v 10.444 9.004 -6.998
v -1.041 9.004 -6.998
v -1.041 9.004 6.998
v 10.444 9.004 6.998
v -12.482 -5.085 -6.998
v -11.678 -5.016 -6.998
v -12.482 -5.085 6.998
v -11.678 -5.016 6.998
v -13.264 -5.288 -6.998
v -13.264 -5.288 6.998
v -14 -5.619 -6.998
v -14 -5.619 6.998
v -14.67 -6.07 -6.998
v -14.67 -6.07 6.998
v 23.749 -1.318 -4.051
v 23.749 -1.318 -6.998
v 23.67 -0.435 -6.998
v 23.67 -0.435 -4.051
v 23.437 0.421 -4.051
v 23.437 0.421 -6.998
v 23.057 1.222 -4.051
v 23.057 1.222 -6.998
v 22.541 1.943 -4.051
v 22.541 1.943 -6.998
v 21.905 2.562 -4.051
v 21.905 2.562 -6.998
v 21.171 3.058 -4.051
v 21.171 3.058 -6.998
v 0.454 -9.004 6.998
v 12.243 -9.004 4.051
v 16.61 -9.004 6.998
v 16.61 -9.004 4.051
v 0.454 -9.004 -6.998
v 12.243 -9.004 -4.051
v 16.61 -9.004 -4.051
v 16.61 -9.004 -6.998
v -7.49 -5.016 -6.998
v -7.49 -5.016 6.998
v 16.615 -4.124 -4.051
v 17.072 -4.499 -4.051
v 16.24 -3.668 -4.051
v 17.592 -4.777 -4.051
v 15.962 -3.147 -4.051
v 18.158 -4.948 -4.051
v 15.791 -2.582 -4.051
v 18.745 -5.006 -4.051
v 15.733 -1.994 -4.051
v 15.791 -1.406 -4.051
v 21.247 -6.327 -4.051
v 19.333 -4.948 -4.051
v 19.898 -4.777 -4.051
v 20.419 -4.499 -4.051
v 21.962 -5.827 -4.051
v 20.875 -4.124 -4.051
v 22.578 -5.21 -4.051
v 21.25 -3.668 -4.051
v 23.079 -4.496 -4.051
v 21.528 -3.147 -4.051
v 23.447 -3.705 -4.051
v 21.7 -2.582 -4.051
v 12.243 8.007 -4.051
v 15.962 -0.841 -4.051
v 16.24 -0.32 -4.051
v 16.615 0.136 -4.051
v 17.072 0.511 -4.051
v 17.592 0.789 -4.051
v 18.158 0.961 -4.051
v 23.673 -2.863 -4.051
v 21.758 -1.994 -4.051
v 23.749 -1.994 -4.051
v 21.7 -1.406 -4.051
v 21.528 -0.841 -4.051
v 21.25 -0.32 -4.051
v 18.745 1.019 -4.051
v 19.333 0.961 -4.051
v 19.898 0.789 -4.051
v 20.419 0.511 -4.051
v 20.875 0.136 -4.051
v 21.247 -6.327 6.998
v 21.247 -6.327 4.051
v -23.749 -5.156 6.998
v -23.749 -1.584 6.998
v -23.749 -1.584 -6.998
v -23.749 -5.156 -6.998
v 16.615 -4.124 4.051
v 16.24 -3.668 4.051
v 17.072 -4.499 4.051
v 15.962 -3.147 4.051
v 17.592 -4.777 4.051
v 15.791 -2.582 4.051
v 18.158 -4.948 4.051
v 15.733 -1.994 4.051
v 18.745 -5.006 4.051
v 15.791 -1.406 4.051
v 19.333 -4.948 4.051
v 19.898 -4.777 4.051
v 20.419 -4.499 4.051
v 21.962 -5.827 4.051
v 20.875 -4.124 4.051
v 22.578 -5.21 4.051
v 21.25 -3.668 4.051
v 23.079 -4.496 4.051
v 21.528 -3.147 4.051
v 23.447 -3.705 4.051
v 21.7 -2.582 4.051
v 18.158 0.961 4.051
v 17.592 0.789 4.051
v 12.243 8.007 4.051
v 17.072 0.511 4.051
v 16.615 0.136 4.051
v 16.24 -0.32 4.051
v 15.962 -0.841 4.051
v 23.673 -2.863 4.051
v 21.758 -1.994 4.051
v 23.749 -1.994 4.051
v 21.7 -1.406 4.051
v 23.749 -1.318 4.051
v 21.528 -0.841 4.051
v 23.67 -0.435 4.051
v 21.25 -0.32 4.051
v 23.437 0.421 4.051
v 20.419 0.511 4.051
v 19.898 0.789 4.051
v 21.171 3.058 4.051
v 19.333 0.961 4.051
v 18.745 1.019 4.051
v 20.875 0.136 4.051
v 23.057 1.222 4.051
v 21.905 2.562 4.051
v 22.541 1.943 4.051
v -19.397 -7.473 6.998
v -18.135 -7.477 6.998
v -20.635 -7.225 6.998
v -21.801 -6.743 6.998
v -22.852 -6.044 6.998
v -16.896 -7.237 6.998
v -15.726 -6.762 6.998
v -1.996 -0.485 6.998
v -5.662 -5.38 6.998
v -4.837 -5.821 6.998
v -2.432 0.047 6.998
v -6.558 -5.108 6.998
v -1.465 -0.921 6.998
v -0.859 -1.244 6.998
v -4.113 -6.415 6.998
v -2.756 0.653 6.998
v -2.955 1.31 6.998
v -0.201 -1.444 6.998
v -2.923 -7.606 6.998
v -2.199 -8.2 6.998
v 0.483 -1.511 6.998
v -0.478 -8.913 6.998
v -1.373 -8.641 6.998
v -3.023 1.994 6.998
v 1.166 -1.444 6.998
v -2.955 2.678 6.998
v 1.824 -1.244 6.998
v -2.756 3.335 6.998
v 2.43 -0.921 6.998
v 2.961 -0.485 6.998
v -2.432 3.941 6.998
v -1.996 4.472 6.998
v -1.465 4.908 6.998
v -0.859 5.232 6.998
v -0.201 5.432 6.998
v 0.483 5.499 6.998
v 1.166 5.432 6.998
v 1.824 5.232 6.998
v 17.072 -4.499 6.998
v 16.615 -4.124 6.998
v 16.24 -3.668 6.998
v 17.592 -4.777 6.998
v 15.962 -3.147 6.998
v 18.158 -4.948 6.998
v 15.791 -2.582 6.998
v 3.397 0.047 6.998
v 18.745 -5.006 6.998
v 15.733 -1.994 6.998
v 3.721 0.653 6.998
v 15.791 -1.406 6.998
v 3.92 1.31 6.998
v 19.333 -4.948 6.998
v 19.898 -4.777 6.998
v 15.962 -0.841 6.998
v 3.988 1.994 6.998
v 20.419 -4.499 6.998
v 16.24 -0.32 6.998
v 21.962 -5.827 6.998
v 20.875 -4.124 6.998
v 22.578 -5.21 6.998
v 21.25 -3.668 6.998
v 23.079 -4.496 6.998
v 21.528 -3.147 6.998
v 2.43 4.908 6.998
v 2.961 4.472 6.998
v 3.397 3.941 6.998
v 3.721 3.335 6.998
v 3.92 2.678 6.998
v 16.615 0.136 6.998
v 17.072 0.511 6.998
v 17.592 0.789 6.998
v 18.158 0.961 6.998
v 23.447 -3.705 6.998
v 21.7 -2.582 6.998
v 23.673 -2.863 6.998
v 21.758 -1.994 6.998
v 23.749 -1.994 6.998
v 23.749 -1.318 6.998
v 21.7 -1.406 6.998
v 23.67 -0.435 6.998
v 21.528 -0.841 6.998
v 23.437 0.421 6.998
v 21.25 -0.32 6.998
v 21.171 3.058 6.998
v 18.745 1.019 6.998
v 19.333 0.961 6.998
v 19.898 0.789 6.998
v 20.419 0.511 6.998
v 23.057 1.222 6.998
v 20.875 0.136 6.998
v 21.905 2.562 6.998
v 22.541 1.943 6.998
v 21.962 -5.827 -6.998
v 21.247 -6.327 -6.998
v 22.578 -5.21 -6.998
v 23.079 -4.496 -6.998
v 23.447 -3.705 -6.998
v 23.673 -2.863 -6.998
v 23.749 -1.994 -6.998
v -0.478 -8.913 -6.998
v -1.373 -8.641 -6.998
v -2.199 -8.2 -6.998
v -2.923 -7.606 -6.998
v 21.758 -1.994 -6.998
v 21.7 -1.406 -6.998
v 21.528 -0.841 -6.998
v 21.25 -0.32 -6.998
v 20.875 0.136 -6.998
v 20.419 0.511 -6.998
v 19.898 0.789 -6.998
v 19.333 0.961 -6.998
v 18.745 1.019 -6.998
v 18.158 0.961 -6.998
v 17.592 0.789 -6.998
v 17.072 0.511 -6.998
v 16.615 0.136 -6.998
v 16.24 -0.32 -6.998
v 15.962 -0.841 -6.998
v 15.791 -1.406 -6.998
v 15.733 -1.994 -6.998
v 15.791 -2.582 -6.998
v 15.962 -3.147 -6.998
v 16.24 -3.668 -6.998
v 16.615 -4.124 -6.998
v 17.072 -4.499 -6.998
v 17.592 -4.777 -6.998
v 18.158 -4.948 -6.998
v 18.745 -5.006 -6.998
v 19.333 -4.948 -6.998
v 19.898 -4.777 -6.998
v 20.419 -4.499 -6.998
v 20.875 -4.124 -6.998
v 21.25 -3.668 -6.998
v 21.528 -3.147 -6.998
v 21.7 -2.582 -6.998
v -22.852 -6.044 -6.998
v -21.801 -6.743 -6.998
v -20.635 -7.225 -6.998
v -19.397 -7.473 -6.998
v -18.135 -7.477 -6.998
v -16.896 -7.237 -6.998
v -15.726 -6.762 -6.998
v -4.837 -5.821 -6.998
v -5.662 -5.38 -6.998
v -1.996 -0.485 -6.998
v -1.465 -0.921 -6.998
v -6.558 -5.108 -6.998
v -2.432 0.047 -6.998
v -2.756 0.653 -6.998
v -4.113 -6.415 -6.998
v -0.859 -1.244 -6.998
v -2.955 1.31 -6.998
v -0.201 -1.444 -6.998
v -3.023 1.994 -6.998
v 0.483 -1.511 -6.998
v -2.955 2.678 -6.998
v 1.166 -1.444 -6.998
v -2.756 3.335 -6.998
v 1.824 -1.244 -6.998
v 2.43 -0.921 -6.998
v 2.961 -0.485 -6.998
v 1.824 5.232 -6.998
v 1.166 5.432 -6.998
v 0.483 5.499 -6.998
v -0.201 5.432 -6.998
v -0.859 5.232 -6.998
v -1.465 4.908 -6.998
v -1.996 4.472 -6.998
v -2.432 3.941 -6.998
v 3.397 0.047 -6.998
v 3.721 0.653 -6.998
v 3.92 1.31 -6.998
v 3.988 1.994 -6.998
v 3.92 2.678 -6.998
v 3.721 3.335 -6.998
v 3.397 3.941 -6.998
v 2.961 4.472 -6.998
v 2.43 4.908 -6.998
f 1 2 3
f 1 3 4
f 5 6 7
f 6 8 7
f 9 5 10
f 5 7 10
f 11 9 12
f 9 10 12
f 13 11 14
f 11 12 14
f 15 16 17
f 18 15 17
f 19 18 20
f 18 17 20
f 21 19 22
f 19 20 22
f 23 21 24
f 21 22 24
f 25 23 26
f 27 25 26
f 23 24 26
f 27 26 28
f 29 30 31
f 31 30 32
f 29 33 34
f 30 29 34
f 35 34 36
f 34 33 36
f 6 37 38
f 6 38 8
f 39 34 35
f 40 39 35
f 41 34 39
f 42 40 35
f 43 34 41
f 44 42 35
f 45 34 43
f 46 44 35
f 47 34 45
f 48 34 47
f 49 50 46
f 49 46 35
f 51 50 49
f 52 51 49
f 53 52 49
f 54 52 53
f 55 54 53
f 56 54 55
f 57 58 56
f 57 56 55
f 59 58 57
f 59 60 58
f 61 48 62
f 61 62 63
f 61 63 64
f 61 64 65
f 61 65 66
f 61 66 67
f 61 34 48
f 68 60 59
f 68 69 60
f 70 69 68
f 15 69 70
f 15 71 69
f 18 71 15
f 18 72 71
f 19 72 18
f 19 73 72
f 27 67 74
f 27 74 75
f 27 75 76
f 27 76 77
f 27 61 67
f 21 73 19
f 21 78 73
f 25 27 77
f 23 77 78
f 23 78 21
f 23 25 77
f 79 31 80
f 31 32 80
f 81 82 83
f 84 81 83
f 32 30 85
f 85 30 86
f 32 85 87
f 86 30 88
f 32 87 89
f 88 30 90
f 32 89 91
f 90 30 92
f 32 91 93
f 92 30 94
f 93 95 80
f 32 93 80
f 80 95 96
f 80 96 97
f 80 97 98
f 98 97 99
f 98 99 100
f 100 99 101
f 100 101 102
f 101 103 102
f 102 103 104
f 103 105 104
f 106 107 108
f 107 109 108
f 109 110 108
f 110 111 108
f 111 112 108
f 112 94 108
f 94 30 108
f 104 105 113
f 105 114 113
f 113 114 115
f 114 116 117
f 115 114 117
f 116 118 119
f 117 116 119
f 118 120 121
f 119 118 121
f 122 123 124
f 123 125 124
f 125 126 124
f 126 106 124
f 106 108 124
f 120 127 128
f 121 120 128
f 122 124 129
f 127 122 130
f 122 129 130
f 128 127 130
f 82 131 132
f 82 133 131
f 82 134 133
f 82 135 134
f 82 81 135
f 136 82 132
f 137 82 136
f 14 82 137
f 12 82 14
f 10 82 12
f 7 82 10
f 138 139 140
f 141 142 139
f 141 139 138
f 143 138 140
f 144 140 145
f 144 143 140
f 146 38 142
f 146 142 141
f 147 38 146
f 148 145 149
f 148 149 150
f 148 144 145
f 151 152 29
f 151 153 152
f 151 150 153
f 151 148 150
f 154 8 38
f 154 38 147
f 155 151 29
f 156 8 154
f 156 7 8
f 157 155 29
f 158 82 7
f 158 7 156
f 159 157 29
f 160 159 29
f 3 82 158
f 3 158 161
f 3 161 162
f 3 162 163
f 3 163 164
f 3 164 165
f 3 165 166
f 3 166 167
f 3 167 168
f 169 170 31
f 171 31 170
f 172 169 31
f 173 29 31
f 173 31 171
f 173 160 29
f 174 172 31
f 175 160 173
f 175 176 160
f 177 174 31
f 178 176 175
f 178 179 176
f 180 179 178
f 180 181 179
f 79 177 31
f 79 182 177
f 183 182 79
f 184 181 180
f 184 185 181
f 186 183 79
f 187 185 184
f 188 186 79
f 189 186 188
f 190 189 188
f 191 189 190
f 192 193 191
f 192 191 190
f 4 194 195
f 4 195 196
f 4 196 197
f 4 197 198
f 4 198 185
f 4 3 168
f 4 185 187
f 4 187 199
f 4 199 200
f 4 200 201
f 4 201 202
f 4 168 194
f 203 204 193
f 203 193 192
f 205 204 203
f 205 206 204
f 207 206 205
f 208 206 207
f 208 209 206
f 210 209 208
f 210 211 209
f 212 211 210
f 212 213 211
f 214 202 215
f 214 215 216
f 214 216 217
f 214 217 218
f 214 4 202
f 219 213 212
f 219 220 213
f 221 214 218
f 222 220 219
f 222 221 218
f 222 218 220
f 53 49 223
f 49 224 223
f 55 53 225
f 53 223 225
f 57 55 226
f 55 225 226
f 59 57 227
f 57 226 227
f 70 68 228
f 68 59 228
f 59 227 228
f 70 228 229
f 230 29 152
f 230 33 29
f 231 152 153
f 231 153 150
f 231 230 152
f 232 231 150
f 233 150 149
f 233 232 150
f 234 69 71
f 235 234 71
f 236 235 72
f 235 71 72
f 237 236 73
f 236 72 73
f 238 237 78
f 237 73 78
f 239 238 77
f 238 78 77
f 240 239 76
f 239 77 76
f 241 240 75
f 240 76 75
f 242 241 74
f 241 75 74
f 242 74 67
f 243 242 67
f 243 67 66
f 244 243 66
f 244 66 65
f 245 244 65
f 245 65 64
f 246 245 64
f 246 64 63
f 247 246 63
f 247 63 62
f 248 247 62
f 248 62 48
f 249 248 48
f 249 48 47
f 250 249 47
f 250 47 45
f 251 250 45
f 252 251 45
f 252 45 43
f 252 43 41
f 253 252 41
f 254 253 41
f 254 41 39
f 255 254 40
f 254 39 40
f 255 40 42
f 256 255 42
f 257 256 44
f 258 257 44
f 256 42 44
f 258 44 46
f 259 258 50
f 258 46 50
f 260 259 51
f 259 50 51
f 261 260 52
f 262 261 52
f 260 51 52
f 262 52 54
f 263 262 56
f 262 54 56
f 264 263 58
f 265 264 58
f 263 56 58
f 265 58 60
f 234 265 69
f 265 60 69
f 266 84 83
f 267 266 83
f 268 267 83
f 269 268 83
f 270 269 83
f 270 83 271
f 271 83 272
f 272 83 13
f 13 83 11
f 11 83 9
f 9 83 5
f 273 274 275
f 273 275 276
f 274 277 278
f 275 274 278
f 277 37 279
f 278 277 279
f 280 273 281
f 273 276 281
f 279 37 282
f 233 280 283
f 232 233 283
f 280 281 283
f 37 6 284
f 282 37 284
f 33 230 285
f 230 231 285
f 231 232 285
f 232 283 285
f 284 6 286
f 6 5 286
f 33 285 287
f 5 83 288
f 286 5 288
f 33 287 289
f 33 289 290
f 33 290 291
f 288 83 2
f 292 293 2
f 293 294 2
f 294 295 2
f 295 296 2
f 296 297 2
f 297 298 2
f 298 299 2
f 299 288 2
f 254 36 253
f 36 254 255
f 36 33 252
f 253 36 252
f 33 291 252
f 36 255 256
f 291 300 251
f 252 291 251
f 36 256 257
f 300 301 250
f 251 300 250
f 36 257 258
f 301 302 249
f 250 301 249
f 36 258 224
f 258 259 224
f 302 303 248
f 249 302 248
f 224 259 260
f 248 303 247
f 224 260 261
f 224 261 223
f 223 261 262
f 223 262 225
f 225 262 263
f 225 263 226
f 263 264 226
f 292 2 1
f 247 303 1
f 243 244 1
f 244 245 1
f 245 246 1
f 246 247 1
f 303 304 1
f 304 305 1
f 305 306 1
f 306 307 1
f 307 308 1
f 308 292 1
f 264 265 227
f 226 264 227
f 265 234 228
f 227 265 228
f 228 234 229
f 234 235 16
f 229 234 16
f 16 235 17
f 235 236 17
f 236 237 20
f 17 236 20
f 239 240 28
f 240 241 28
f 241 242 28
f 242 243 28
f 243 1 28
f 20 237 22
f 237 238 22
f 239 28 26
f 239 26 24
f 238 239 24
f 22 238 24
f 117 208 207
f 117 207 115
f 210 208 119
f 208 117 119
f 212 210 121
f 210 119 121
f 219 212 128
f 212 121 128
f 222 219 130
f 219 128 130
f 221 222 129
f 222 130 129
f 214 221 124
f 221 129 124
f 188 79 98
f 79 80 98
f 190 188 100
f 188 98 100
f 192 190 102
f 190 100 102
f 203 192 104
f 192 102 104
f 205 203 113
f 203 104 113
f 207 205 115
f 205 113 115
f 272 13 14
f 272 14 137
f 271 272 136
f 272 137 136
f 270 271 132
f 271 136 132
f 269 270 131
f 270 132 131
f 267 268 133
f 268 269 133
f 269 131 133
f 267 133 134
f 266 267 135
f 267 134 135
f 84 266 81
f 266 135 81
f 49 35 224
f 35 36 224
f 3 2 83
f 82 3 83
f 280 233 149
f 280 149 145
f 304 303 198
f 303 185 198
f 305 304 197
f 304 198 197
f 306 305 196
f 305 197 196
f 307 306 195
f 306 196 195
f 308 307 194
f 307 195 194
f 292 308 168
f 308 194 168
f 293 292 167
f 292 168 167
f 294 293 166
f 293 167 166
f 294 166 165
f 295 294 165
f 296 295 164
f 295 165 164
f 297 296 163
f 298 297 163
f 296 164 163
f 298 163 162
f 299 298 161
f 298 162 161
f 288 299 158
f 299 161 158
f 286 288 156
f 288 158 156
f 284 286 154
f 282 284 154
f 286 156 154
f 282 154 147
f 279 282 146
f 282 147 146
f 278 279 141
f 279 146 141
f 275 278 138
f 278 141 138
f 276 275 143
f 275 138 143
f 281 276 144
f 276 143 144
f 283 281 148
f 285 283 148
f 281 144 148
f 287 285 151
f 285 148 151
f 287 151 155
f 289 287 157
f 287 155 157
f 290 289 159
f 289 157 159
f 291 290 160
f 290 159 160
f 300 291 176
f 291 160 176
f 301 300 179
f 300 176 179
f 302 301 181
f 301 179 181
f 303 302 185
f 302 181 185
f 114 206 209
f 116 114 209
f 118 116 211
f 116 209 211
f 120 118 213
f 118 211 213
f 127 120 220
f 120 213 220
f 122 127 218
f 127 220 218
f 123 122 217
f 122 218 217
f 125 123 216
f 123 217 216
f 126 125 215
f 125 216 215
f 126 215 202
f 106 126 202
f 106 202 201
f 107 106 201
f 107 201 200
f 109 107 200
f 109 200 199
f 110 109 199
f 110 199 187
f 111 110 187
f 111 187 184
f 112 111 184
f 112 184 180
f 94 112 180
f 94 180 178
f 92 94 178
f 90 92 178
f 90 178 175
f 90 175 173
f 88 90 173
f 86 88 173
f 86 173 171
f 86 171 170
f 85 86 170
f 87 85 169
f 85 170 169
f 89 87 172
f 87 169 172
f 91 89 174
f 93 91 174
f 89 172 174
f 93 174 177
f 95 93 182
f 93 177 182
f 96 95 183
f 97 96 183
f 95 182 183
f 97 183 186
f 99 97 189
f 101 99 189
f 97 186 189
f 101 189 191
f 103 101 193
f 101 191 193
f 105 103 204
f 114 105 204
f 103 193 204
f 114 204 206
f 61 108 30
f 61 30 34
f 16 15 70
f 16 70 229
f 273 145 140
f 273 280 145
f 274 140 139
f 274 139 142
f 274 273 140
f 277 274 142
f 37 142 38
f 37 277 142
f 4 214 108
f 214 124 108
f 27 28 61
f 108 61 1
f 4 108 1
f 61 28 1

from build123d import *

# Parameters (mm, degrees)
SKETCH2_W               = 47.498
SKETCH2_H               = 13.9954
BOSS_EXTRUDE1_DEPTH     = 9.0043
SKETCH3_R               = 3.01244
SKETCH3_R_2             = 3.5052
CUT_EXTRUDE1_DEPTH      = 7.9977
CUT_EXTRUDE1_DEPTH_BACK = 7.9977
SKETCH5_OUTSIDE_W       = 60.036
SKETCH5_OUTSIDE_H       = 30.546
CUT_EXTRUDE2_DEPTH      = 7.9977
CUT_EXTRUDE2_DEPTH_BACK = 7.9977
CUT_EXTRUDE3_DEPTH      = 7.9977
CUT_EXTRUDE3_DEPTH_BACK = 7.9977
FILLET1_R               = 4.7752
SKETCH7_W               = 11.5062
SKETCH7_H               = 8.1026
CUT_EXTRUDE4_DEPTH      = 10.0043
CUT_EXTRUDE4_DEPTH_BACK = 10.0043


with BuildPart() as part:
    # Sketch2 → Boss-Extrude1 (new body, symmetric)
    with BuildSketch(Plane(origin=(0, 0, 0), x_dir=(1, 0, 0), z_dir=(0, 1, 0))):
        Rectangle(SKETCH2_W, SKETCH2_H)
    extrude(amount=BOSS_EXTRUDE1_DEPTH, both=True)

    # Sketch3 → Cut-Extrude1 (cut, two sides)
    with BuildSketch(Plane.XY) as cut_extrude1_sk:
        with Locations((18.7452, -1.9939)):
            Circle(SKETCH3_R)
        with Locations((0.4826, 1.9939)):
            Circle(SKETCH3_R_2)
    extrude(amount=CUT_EXTRUDE1_DEPTH, mode=Mode.SUBTRACT)
    extrude(cut_extrude1_sk.sketch, amount=-CUT_EXTRUDE1_DEPTH_BACK, mode=Mode.SUBTRACT)

    # Sketch5 outside → Cut-Extrude2 (cut, two sides)
    with BuildSketch(Plane.XY) as cut_extrude2_sk:
        Rectangle(SKETCH5_OUTSIDE_W, SKETCH5_OUTSIDE_H)
        with BuildLine():
            Line((16.610431019, -9.0043), (21.2471, -6.327317915))
            ThreePointArc((21.2471, -6.327317915), (23.078617915, -4.4958), (23.749, -1.9939))
            Line((23.749, -1.9939), (23.749, -1.317979314))
            ThreePointArc((23.749, -1.317979314), (23.056619993, 1.221641146), (21.171090378, 3.058442776))
            Line((21.171090378, 3.058442776), (10.44448, 9.0043))
            Line((10.44448, 9.0043), (-1.0414, 9.0043))
            Line((-1.0414, 9.0043), (-23.749, -1.584427778))
            Line((-23.749, -1.584427778), (-23.749, -9.0043))
            Line((-23.749, -9.0043), (16.610431019, -9.0043))
        make_face(mode=Mode.SUBTRACT)
    extrude(amount=CUT_EXTRUDE2_DEPTH, mode=Mode.SUBTRACT)
    extrude(cut_extrude2_sk.sketch, amount=-CUT_EXTRUDE2_DEPTH_BACK, mode=Mode.SUBTRACT)

    # Sketch6 → Cut-Extrude3 (cut, two sides)
    with BuildSketch(Plane.XY) as cut_extrude3_sk:
        with BuildLine():
            Line((-1.524, -9.0043), (-5.5118, -5.0165))
            Line((-5.5118, -5.0165), (-13.629006931, -5.0165))
            ThreePointArc((-13.629006931, -5.0165), (-18.655709059, -7.50508415), (-23.749, -5.155792182))
            Line((-23.749, -5.155792182), (-23.749, -9.0043))
            Line((-23.749, -9.0043), (-1.524, -9.0043))
        make_face()
    extrude(amount=CUT_EXTRUDE3_DEPTH, mode=Mode.SUBTRACT)
    extrude(cut_extrude3_sk.sketch, amount=-CUT_EXTRUDE3_DEPTH_BACK, mode=Mode.SUBTRACT)

    # Fillet1
    fillet1_edges = [part.edges().sort_by_distance(p)[0] for p in [
        (-13.629006931, -5.0165, 0),
        (-5.5118, -5.0165, 0),
        (-1.524, -9.0043, 0),
    ]]
    fillet(fillet1_edges, radius=FILLET1_R)

    # Sketch7 → Cut-Extrude4 (cut, two sides)
    with BuildSketch(Plane(origin=(0, 0, 0), x_dir=(1, 0, 0), z_dir=(0, 1, 0))) as cut_extrude4_sk:
        with Locations((17.9959, 0)):
            Rectangle(SKETCH7_W, SKETCH7_H)
    extrude(amount=CUT_EXTRUDE4_DEPTH, mode=Mode.SUBTRACT)
    extrude(cut_extrude4_sk.sketch, amount=-CUT_EXTRUDE4_DEPTH_BACK, mode=Mode.SUBTRACT)


solid = part.part
